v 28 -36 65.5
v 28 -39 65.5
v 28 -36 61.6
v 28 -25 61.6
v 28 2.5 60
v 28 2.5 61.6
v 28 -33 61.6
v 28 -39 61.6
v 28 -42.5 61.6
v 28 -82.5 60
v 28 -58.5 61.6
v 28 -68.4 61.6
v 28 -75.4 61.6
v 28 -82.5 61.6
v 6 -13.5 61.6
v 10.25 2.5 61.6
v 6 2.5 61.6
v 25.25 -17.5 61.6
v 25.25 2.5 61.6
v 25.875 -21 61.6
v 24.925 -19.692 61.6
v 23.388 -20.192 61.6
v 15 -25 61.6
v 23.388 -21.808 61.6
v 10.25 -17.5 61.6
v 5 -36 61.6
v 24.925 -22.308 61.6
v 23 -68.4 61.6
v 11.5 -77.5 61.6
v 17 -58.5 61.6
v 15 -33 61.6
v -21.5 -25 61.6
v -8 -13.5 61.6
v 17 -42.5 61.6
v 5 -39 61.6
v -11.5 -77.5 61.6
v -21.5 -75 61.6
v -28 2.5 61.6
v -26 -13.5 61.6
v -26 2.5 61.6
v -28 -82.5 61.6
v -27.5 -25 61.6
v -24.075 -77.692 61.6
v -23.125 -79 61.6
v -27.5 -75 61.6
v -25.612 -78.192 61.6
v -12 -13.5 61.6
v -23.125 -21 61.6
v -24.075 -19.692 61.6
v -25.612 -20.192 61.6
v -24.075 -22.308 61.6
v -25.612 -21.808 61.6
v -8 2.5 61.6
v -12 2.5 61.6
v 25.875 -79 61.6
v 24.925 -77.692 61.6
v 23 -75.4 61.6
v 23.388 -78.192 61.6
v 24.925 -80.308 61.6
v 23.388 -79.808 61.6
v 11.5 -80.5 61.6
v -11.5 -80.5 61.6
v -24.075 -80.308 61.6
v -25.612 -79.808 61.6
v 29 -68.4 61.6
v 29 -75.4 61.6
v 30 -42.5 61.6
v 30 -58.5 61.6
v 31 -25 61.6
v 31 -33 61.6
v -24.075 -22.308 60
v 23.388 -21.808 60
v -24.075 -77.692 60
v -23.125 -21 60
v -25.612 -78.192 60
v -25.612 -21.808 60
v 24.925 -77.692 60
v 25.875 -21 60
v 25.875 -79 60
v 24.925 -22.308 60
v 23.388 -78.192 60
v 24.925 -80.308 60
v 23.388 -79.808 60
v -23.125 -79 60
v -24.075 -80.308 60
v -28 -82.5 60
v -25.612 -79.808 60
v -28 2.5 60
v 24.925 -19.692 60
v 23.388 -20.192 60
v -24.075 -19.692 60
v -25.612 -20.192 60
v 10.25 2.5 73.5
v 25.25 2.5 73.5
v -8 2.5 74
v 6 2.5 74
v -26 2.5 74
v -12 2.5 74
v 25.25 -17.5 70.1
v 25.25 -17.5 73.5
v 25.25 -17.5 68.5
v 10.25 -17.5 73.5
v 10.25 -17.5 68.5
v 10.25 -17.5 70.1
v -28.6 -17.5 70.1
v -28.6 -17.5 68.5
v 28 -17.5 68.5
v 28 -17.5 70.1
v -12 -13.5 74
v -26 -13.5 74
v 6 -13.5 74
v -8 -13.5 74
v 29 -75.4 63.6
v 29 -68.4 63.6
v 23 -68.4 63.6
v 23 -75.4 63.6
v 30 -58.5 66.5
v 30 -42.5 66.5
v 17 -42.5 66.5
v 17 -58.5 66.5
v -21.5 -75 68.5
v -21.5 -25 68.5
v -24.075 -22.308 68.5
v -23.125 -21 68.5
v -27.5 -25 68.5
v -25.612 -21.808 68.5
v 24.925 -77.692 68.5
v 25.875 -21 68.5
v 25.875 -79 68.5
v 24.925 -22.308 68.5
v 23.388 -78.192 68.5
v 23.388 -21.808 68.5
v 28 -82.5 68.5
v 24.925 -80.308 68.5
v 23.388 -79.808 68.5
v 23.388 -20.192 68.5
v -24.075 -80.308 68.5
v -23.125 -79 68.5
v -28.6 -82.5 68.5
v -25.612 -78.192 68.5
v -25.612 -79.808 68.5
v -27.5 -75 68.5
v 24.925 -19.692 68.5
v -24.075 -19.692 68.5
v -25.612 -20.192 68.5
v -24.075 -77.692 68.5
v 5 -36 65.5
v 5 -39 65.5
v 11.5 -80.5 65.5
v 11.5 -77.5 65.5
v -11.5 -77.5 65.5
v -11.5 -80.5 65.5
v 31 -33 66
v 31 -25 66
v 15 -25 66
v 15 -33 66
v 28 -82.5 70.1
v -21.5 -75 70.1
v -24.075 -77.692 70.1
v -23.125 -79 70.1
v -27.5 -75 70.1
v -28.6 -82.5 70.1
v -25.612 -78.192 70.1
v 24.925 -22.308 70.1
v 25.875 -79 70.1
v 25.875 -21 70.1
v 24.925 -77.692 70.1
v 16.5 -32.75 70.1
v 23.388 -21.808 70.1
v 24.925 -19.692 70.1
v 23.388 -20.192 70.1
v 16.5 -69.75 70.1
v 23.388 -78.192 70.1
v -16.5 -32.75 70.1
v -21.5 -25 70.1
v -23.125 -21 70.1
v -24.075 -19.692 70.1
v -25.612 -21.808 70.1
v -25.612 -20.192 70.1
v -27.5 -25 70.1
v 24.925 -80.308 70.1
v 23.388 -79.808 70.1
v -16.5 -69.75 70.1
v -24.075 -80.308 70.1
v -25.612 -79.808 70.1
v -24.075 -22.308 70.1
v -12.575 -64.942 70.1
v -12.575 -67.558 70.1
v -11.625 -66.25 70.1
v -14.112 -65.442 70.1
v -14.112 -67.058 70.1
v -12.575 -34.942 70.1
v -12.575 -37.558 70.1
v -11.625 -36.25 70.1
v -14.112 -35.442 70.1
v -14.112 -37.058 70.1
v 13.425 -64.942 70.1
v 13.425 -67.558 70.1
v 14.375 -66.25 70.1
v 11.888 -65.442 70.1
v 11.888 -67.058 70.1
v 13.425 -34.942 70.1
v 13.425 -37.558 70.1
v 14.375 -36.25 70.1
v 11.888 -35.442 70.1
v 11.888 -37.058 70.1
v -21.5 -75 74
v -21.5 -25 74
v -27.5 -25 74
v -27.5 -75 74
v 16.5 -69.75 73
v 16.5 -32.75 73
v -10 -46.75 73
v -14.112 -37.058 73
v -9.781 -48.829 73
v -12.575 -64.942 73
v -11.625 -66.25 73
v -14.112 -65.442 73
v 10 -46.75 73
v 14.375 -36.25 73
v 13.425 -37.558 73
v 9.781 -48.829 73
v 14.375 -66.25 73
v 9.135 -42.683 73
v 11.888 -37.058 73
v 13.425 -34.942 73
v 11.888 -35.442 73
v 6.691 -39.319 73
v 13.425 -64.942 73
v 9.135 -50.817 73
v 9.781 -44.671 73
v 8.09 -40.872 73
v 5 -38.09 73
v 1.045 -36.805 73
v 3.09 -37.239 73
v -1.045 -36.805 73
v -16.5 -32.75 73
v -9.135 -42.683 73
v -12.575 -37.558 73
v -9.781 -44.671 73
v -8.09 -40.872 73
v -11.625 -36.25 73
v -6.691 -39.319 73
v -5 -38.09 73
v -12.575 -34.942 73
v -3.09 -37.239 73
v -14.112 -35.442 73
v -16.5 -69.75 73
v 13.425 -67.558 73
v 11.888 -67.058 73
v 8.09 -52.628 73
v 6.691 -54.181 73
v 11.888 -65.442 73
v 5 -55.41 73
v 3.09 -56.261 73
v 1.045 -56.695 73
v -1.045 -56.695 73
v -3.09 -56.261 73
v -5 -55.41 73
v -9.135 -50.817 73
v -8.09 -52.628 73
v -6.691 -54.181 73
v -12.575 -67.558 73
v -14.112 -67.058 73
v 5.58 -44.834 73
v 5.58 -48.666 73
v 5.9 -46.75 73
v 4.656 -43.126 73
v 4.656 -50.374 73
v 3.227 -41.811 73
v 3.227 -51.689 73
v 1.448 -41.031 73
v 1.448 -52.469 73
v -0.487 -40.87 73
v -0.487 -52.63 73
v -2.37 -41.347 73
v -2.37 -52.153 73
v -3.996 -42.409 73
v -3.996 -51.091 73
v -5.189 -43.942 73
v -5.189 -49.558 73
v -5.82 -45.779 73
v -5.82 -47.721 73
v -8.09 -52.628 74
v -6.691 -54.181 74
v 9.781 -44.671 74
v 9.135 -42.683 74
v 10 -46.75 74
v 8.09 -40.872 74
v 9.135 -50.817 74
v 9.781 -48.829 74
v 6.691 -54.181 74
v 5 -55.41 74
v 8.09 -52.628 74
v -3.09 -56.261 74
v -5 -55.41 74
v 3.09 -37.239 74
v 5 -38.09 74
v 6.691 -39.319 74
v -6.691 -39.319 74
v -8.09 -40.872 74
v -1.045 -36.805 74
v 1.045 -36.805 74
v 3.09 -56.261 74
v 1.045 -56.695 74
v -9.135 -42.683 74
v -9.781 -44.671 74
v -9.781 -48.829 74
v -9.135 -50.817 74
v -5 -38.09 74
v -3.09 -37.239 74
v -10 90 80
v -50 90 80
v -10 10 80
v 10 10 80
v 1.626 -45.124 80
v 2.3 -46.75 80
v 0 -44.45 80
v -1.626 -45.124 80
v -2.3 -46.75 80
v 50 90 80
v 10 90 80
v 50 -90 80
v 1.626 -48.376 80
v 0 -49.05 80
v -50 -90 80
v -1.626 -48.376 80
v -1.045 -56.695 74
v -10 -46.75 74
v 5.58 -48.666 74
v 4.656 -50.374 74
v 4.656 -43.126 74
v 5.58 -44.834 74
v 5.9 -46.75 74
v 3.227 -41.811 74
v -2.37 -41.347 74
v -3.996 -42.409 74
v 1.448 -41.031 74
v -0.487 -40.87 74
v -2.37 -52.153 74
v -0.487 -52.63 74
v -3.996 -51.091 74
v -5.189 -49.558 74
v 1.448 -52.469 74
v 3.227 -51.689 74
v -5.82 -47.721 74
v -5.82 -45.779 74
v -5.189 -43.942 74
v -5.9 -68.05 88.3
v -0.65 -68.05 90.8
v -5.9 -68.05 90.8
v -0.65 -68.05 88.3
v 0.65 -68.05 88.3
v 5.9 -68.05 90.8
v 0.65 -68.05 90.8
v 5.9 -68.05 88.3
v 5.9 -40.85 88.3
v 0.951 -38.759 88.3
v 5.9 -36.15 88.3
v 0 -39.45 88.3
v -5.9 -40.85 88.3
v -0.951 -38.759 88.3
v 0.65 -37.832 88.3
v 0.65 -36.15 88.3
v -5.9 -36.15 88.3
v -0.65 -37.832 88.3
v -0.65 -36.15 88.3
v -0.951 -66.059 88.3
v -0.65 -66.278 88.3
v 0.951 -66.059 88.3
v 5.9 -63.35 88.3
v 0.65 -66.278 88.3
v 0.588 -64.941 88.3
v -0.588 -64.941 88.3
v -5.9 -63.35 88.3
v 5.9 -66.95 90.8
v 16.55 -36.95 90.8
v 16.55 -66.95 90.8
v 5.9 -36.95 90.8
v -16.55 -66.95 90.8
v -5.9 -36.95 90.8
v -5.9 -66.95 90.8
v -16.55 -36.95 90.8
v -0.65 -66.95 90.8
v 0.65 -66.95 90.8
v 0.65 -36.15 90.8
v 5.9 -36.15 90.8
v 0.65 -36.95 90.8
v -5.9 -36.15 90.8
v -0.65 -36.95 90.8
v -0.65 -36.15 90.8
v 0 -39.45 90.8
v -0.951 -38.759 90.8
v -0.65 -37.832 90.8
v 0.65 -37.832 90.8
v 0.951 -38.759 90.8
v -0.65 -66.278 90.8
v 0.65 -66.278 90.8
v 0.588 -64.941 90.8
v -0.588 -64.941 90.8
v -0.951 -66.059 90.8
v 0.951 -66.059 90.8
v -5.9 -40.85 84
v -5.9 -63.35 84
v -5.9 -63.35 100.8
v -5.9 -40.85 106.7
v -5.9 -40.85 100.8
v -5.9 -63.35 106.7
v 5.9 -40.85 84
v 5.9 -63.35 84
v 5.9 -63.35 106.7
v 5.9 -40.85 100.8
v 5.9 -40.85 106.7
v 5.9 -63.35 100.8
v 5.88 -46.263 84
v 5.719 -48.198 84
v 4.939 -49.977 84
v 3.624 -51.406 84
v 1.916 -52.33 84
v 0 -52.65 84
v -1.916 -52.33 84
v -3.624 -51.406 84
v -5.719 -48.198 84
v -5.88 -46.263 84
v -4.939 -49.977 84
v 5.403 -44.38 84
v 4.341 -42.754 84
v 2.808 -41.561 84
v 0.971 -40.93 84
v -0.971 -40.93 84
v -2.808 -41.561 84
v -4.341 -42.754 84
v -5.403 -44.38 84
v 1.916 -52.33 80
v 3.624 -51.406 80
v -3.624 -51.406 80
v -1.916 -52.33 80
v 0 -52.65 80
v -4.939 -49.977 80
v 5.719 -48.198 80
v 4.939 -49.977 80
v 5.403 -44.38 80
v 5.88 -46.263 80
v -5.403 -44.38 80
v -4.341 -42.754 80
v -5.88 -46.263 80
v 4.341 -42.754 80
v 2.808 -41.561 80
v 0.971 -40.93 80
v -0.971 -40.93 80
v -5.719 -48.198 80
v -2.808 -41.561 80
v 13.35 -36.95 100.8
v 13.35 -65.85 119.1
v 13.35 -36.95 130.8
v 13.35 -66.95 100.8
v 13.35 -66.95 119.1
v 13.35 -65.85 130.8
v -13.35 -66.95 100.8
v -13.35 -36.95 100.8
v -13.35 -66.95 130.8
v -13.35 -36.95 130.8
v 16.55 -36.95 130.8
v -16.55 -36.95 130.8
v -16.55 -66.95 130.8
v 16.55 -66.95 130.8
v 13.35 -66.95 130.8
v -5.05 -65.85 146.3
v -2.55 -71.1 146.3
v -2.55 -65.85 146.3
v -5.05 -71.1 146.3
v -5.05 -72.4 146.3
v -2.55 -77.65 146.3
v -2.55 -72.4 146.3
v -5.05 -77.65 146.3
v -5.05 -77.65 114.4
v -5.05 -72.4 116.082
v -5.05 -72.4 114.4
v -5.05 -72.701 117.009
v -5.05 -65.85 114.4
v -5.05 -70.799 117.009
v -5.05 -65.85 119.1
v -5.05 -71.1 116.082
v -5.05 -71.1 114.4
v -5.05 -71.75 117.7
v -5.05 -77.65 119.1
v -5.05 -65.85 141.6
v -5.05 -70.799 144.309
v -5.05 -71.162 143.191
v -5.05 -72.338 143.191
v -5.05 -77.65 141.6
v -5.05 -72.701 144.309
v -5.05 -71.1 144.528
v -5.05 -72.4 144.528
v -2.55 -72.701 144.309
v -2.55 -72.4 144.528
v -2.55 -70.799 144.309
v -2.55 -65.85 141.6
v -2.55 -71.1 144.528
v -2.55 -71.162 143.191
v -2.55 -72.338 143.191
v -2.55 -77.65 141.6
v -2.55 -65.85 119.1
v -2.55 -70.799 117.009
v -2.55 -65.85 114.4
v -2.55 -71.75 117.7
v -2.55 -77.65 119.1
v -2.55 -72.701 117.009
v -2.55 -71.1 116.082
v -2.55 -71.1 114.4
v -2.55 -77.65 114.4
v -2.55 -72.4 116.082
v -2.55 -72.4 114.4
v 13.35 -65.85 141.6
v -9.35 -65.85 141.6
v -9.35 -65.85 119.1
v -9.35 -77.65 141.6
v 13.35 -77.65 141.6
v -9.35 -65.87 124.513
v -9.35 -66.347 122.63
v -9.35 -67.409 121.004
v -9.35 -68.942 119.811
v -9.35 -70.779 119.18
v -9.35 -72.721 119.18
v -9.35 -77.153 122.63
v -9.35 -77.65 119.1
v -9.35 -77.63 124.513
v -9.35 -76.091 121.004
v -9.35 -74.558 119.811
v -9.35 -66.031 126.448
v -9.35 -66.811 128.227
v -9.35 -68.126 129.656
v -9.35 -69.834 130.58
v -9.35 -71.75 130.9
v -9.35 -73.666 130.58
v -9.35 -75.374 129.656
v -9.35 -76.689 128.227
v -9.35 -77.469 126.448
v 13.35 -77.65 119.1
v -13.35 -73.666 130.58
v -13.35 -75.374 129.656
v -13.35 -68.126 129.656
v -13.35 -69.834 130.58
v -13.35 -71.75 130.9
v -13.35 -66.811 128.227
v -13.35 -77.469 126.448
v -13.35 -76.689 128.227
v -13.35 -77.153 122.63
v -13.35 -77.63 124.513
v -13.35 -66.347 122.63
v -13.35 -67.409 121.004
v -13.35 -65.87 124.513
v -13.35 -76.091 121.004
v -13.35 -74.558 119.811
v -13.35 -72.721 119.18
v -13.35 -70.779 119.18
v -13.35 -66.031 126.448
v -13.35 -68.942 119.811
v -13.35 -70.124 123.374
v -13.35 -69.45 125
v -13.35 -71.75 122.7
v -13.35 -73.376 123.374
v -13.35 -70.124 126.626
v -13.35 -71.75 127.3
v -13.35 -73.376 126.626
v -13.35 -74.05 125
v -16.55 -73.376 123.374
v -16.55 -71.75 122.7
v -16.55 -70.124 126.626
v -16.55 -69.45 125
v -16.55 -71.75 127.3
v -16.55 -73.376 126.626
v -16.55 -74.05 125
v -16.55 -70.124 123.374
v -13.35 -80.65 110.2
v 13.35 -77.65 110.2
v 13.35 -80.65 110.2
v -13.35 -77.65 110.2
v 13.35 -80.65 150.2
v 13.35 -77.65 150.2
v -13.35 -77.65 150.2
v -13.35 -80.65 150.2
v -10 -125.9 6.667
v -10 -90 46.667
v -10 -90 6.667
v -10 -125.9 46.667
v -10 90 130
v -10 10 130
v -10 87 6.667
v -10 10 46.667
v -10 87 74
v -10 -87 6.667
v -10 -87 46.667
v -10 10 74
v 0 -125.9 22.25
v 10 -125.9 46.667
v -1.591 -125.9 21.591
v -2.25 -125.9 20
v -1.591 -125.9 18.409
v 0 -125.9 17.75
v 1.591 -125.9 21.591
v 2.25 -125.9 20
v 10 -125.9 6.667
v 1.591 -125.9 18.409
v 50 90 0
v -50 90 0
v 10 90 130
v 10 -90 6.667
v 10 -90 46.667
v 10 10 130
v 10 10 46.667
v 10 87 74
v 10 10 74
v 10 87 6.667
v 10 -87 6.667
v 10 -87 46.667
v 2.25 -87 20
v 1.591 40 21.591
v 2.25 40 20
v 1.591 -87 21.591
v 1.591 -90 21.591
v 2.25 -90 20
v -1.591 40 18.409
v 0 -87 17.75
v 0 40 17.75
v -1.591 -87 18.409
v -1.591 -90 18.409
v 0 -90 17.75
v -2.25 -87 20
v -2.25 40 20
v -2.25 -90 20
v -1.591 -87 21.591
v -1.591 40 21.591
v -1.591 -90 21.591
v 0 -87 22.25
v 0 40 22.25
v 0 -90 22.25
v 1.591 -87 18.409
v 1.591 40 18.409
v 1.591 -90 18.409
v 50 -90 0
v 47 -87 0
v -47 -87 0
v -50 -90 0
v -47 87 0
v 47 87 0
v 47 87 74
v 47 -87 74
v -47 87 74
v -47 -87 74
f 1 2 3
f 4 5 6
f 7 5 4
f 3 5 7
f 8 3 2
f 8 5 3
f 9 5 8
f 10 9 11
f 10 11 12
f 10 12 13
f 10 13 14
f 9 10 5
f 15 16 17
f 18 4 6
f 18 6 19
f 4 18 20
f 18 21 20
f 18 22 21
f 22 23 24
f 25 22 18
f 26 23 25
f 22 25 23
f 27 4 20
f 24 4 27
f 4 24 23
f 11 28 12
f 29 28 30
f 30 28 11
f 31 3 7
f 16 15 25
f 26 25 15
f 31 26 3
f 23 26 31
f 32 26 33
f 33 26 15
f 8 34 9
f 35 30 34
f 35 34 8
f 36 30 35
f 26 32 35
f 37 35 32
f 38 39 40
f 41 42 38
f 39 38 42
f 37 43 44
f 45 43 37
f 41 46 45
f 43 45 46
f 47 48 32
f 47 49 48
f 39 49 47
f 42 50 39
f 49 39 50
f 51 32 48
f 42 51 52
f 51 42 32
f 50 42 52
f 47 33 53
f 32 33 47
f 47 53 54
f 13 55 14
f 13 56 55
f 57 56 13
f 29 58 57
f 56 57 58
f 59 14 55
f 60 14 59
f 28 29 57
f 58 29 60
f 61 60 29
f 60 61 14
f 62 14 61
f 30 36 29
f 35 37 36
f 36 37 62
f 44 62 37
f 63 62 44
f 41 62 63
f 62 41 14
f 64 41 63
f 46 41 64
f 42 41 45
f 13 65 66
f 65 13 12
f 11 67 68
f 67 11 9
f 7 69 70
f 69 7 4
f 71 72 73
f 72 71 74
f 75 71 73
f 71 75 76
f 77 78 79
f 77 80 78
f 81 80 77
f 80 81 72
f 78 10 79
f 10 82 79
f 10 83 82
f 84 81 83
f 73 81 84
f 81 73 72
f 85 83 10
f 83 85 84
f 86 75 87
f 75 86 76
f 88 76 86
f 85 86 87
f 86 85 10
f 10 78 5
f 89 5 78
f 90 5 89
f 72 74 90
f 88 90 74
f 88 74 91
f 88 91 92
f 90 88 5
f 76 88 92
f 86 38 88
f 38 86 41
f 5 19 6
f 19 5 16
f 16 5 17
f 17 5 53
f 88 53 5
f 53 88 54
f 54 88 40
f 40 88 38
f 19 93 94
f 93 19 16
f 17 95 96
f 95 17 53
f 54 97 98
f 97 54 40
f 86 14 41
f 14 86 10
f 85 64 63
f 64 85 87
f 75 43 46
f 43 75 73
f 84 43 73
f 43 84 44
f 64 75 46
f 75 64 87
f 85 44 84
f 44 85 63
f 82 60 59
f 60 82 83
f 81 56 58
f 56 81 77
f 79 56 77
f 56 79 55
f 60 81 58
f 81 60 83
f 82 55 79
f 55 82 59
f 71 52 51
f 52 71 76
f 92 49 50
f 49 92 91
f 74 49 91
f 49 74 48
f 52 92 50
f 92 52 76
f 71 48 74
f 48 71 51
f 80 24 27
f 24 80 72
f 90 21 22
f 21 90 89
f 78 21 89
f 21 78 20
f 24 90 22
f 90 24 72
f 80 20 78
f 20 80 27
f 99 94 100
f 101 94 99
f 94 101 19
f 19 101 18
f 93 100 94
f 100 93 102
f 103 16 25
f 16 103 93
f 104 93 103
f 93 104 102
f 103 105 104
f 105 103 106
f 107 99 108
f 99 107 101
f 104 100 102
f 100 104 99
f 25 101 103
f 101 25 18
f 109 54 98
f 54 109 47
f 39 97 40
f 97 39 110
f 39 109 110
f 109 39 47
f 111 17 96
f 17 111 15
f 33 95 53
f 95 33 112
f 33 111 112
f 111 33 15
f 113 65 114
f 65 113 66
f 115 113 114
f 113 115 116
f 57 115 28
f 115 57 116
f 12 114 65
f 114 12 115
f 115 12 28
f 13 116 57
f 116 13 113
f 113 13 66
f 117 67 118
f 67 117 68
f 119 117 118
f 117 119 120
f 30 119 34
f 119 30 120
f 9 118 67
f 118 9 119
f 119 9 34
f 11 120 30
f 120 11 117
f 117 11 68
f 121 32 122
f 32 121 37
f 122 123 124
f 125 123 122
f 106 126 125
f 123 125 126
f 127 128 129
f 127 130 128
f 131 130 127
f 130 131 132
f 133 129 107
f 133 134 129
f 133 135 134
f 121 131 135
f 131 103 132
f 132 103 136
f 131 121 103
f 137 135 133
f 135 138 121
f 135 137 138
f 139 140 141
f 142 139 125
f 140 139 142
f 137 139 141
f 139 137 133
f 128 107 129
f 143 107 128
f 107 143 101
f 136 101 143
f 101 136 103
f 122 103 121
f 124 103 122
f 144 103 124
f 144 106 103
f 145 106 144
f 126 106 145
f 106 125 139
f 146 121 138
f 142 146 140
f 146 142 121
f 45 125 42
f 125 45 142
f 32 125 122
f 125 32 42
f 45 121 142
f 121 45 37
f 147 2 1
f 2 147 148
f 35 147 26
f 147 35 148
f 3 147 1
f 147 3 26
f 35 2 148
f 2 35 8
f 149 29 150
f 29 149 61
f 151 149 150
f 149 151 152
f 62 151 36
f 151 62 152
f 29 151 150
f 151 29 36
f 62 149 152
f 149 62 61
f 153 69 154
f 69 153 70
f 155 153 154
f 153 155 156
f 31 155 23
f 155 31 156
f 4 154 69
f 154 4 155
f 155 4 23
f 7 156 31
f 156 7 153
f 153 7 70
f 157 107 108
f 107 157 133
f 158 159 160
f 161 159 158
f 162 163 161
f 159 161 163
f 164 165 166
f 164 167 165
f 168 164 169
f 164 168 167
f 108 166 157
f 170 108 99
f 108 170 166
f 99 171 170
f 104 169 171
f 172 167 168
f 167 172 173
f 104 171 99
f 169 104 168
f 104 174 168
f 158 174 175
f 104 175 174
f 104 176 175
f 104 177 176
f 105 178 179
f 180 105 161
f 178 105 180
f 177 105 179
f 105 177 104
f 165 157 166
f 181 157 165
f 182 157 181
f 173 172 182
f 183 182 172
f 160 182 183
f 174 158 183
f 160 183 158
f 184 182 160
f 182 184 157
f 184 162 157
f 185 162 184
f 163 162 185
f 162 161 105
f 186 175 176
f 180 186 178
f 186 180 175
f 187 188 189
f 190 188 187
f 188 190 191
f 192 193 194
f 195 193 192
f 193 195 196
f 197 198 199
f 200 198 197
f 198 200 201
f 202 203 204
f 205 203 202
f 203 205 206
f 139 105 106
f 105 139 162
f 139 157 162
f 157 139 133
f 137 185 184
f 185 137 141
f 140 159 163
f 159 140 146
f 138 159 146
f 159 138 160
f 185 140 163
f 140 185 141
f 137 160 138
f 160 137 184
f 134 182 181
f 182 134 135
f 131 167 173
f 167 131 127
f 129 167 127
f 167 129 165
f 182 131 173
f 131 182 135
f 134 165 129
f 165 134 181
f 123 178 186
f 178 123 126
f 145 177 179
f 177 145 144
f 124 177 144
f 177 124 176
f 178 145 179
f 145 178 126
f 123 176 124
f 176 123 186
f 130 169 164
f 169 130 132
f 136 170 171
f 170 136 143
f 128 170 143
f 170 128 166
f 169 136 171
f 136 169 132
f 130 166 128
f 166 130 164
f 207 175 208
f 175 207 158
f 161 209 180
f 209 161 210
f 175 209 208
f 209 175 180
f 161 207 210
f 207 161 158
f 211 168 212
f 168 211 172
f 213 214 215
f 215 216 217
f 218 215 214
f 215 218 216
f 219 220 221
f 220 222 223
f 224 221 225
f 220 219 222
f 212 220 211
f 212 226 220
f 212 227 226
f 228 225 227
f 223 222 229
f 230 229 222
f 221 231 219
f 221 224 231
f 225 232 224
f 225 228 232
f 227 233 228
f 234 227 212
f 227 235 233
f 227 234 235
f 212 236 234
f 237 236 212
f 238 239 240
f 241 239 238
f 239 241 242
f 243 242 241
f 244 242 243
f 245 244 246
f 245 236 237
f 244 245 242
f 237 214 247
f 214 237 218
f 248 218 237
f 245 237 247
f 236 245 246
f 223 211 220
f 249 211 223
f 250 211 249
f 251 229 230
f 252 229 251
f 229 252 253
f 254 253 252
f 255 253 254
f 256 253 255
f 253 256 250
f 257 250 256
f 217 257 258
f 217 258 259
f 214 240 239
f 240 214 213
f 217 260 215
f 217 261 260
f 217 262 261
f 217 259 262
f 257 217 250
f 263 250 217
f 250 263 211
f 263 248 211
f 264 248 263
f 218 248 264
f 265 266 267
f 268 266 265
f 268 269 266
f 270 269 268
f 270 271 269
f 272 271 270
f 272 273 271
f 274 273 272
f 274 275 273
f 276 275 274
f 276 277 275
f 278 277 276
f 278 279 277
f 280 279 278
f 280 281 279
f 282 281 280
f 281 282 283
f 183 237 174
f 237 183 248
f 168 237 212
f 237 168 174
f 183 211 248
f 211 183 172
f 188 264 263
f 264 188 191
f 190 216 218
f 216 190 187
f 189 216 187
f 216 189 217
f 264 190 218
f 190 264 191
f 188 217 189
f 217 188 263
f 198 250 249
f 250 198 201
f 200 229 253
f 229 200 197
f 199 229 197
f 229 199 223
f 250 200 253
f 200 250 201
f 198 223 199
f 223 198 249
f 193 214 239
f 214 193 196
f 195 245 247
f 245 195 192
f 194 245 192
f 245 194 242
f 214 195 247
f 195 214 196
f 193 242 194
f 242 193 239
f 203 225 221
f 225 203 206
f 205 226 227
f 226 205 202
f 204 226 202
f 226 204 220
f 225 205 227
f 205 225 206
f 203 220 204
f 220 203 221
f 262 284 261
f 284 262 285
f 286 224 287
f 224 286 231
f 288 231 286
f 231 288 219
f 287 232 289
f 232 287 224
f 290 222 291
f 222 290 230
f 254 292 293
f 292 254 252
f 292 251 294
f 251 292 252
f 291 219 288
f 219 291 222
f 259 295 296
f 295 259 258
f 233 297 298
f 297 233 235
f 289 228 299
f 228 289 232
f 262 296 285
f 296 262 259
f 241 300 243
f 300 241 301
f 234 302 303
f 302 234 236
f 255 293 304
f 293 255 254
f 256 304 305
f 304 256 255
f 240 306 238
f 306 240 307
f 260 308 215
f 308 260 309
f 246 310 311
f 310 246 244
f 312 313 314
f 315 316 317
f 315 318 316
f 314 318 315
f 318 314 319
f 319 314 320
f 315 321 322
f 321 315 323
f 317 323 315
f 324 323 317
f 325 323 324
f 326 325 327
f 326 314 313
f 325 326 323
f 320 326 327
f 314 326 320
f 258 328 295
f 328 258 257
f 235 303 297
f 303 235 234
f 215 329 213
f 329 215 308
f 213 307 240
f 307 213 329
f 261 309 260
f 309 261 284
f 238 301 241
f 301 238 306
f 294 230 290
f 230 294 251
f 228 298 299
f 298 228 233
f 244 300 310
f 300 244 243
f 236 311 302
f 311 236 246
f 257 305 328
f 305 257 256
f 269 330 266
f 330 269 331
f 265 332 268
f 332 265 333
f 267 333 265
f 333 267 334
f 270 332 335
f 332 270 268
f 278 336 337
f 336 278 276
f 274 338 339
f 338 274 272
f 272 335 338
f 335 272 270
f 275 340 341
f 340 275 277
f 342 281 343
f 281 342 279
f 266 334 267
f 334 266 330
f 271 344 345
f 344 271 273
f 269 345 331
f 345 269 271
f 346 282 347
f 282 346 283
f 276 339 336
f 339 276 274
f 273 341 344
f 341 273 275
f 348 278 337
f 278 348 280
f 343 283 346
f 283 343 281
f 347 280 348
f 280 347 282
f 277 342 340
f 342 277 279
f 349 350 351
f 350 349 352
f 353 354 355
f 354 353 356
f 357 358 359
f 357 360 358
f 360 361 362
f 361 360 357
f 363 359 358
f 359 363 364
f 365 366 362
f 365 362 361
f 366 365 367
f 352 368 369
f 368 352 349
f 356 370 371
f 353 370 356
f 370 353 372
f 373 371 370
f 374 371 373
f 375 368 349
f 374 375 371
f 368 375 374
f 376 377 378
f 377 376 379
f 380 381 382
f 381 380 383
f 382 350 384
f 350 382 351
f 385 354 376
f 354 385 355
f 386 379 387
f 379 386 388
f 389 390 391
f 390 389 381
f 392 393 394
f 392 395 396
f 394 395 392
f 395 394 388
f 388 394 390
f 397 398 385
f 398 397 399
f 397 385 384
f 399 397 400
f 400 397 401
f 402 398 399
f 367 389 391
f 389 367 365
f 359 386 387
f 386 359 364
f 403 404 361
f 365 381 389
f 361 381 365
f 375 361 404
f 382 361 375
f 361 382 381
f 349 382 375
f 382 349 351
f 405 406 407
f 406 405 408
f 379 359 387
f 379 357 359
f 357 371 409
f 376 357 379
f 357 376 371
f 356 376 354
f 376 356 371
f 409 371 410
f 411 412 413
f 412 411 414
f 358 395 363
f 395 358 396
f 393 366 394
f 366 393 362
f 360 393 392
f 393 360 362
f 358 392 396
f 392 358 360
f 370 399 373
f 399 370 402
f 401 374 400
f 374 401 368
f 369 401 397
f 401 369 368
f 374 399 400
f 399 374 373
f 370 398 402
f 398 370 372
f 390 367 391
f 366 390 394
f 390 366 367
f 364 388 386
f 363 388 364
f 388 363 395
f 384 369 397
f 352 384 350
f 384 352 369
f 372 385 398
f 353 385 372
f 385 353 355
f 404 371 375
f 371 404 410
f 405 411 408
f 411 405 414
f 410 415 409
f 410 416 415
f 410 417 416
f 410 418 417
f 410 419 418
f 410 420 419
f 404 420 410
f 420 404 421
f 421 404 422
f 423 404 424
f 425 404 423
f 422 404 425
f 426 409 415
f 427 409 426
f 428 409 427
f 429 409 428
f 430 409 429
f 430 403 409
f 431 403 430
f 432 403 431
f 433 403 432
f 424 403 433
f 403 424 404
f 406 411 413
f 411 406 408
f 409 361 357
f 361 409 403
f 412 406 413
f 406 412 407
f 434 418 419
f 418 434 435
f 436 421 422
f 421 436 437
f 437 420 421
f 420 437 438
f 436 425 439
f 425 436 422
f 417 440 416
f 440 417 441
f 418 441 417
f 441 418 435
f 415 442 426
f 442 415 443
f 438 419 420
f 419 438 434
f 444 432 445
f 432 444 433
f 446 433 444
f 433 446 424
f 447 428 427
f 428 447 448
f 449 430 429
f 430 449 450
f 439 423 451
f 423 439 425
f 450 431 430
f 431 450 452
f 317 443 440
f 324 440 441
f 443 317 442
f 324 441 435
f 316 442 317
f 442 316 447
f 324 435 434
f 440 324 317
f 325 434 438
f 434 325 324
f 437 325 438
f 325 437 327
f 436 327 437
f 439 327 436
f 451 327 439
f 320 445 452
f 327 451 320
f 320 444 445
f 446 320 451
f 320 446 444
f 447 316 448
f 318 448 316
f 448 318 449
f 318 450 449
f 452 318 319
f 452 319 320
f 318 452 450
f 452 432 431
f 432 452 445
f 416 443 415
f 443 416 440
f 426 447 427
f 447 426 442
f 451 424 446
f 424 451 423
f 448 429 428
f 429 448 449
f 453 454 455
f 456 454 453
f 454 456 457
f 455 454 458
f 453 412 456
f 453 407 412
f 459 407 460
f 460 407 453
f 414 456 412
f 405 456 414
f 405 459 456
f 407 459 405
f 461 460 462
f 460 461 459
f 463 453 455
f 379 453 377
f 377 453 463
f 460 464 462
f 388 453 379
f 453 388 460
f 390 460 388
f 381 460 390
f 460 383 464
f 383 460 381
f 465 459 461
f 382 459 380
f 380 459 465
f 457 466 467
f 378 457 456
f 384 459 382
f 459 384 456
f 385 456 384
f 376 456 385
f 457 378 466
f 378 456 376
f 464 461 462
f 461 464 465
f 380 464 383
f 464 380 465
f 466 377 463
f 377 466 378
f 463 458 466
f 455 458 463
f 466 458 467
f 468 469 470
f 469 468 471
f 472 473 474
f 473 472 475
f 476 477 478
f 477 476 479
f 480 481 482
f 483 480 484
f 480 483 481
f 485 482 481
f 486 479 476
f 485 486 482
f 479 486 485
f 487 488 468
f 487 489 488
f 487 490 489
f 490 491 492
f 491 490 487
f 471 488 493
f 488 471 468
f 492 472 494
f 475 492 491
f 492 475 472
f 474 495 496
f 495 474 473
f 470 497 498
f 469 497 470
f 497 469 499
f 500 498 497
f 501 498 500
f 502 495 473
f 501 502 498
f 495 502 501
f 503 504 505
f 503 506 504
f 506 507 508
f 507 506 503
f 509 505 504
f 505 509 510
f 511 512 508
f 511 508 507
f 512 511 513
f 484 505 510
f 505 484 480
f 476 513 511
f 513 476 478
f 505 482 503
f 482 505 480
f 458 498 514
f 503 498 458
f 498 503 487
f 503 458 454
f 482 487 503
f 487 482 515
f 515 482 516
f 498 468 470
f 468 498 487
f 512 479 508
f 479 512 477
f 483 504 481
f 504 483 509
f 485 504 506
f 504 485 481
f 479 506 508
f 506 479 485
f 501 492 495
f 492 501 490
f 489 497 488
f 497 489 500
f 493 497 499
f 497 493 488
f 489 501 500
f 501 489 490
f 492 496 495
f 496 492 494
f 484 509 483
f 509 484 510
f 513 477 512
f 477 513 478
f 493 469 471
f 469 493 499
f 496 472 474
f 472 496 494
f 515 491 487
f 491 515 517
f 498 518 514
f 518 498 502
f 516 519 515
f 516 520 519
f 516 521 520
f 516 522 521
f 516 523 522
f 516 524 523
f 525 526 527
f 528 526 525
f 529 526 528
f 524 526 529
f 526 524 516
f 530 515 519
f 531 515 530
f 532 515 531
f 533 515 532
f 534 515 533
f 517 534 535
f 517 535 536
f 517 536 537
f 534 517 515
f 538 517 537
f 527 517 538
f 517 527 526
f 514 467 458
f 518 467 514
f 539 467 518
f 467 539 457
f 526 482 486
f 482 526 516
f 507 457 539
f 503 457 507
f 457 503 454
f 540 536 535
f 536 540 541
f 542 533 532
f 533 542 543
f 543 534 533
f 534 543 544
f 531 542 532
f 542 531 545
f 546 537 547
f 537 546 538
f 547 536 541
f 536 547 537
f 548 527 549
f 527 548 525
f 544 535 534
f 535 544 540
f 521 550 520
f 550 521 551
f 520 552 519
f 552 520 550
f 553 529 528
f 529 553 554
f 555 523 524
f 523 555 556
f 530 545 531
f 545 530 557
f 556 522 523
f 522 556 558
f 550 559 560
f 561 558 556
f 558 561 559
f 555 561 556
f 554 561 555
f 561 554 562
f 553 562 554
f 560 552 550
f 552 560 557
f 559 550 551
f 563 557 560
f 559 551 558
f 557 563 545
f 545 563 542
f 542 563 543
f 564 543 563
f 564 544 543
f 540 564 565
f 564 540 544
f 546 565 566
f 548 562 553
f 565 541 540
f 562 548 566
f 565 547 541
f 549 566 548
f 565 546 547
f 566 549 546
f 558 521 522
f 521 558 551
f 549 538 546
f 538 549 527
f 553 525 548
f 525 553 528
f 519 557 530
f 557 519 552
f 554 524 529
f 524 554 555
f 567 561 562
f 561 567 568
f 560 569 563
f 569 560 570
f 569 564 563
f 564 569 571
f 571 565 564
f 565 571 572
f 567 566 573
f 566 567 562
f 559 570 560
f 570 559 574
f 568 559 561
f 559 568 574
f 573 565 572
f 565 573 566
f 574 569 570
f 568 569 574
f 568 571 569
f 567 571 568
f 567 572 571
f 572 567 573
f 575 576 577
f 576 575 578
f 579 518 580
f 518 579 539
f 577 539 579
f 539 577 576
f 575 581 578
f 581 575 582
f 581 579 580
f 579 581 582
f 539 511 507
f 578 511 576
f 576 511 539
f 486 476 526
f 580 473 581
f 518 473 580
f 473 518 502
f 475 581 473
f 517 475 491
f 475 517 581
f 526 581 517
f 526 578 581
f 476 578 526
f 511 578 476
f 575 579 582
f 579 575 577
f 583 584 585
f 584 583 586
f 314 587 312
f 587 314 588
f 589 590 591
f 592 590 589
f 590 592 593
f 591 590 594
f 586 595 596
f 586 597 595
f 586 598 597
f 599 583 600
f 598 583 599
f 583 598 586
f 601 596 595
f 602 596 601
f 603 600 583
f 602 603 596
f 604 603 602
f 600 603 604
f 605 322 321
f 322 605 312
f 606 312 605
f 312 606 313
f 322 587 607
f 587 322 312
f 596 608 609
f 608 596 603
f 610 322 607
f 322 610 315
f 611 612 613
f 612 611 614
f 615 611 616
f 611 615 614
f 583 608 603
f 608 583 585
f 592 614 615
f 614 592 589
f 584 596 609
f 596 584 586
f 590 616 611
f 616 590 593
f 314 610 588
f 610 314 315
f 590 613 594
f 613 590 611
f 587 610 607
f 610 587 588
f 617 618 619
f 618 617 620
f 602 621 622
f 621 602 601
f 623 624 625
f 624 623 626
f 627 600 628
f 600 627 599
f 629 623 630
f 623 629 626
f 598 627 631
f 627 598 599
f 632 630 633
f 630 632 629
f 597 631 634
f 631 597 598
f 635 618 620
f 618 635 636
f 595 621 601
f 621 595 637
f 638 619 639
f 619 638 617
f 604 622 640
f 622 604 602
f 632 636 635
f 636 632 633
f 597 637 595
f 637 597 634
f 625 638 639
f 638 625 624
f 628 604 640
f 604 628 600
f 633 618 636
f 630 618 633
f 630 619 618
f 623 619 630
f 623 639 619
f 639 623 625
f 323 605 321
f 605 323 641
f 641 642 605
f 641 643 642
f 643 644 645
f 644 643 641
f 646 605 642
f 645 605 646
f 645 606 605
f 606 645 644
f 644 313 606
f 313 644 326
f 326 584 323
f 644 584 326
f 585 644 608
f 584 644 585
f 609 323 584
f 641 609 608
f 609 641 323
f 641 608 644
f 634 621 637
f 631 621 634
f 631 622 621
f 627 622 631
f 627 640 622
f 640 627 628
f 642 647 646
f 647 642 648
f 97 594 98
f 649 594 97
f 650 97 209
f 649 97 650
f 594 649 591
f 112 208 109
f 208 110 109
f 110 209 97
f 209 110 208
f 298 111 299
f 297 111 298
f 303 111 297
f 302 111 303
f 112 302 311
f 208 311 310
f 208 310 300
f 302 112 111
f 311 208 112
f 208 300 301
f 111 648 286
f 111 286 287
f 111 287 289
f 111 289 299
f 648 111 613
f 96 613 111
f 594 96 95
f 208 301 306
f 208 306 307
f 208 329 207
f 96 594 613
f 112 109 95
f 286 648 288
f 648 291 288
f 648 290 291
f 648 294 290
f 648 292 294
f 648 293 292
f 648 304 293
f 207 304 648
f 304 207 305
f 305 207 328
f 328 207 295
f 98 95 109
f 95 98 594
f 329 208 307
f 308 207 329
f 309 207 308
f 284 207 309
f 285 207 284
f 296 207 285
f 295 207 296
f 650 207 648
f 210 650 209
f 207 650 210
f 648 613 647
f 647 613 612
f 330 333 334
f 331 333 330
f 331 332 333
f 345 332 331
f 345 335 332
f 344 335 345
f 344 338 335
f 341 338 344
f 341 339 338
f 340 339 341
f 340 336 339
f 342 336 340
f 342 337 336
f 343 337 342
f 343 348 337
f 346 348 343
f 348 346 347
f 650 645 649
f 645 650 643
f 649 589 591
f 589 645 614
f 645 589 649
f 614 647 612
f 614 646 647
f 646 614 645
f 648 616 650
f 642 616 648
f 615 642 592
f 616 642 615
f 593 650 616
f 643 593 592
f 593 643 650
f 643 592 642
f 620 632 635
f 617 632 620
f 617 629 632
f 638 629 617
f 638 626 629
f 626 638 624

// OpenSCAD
// file: servo_sg90.scad
servo_sg90();

module servo_sg90()
{
    width = 22.5;
    length = 11.8;
    height = 22.7;
    
    mounting_width = width + (2 * 4.7);
    mounting_length = length;
    mounting_height = 2.5;
    mounting_width_offset = -4.7;
    mounting_height_offset = 18.4 - mounting_height;
    
    mounting_hole_diameter = 2;
    mounting_hole_width_offset = 2.3;
    mounting_hole_length_offset = 5.9;
    
    mounting_notch_width = mounting_hole_width_offset;
    mounting_notch_length = 1.3;
    mounting_notch_width_offset = mounting_notch_width / 2;
    
    mount_point_height = 4;
    mount_point_diameter = 11.8;
    mount_point_width_offset = 5.9;
    mount_point_length_offset = length / 2;
    mount_point_height_offset = height;
    
    gear_height = 3.2;
    gear_diameter = 4.6;
    gear_width_offset = mount_point_width_offset;
    gear_length_offset = mount_point_length_offset;
    gear_height_offset = mount_point_height_offset + mount_point_height;
    
    rotate([0, 180, 0])
    translate([-(gear_width_offset), -(gear_length_offset), -(height + mount_point_height)])
    union()
    {
        color("blue", 1.0)
        cube([width, length, height], false);
        
        color("blue", 1.0)
        translate([mounting_width_offset, 0, mounting_height_offset])
        difference()
        {
            cube([mounting_width, mounting_length, mounting_height], false);
            
            translate([mounting_hole_width_offset, mounting_hole_length_offset, 0])
            cylinder(height, d = mounting_hole_diameter);
            
            translate([mounting_width - mounting_hole_width_offset, mounting_hole_length_offset, 0])
            cylinder(height, d = mounting_hole_diameter);
            
            translate([mounting_notch_width_offset, mounting_hole_length_offset, 0])
            cube([mounting_notch_width, mounting_notch_length, height], true);

            translate([mounting_width - mounting_notch_width_offset, mounting_hole_length_offset, 0])
            cube([mounting_notch_width, mounting_notch_length, height], true);
        }
        
        color("blue", 1.0)
        translate([mount_point_width_offset, mount_point_length_offset, mount_point_height_offset])
        cylinder(mount_point_height, d = mount_point_diameter);
        
        color("white", 1.0)
        translate([gear_width_offset, gear_length_offset, gear_height_offset])
        cylinder(gear_height, d = gear_diameter);
    }
}
// file: raspberry_pi_pan_tilt.scad
use <servo_sg90.scad>

raspberry_pi_pan_tilt_base__base_height = 3;
raspberry_pi_pan_tilt_base__bottom_servo_mount_height = 7;

raspberry_pi_pan_tilt(6.5, 0, 0);

module raspberry_pi_pan_tilt(bottom_mount_offset, pan_angle, tilt_angle)
{
    bottom_servo_height_offset = 10;
    
    bottom_servo_housing_width = 26.7;
    bottom_servo_housing_length = 30;
    bottom_servo_housing_height = 10;
    bottom_servo_housing_mount_height = 40;
    bottom_servo_housing_length_offset = -5.2;
    bottom_servo_housing_height_offset = bottom_servo_height_offset + 10.8;
    
    top_servo_width_offset = -(26.7 / 2);//-15;
    top_servo_length_offset = -25;
    top_servo_height_offset = 55;

    top_servo_housing_width = 40;
    top_servo_housing_length = 3;
    top_servo_housing_height = 26.7;
    top_servo_housing_width_offset = -5.2;
    top_servo_housing_length_offset = -5.9 - (top_servo_housing_length / 2);
    top_servo_housing_height_offset = 0;
    
    raspberry_pi_pan_tilt_base(bottom_mount_offset);

    rotate([0, 0, pan_angle])
    union()
    {
        rotate([0, 0, 90])
        translate([0, 0, bottom_servo_height_offset])
        servo_sg90();
        
        translate([0, bottom_servo_housing_length_offset, bottom_servo_housing_height_offset])
        raspberry_pi_pan_tilt_bottom_servo_housing(bottom_servo_housing_width, bottom_servo_housing_length, bottom_servo_housing_height, bottom_servo_housing_mount_height);

        rotate([90, 90, 90])
        translate([-top_servo_height_offset, top_servo_length_offset, top_servo_width_offset])
        rotate([0, 0, tilt_angle])
        union()
        {
            servo_sg90();
            
            translate([top_servo_housing_width_offset, top_servo_housing_length_offset, top_servo_housing_height_offset])
            raspberry_pi_pan_tilt_top_servo_housing(top_servo_housing_width, top_servo_housing_length, top_servo_housing_height);
        }
    }
}

module raspberry_pi_pan_tilt_base(bottom_mount_offset)
{
    base_width = 33;
    base_length = 37;
    base_height = 3;
    
    mounting_hole_width = 26;
    mounting_hole_length = 30;
    
    mounting_hole_diameter = 2.75;
    mounting_hole_width_offset = (base_width - mounting_hole_width) / 2;
    mounting_hole_length_offset = (base_length - mounting_hole_length) / 2;
    
    bottom_servo_mount_height = 7;
    bottom_servo_mount_outer_diameter = 20;
    bottom_servo_mount_inner_diameter = 11.8;
    
    bottom_servo_mount_width_offset = base_width / 2;
    bottom_servo_mount_length_offset = bottom_mount_offset + (base_width / 2);
    bottom_servo_mount_height_offset = base_height;

    translate([-(bottom_servo_mount_width_offset), -(bottom_servo_mount_length_offset), 0])
    color("black", 1.0)
    union()
    {
        difference()
        {
            cube([base_width, base_length, base_height], false);
            
            translate([mounting_hole_width_offset, mounting_hole_length_offset, 0])
            cylinder(base_height * 2, d = mounting_hole_diameter, true);

            translate([base_width - mounting_hole_width_offset, mounting_hole_length_offset, 0])
            cylinder(base_height * 2, d = mounting_hole_diameter, true);

            translate([mounting_hole_width_offset, base_length - mounting_hole_length_offset, 0])
            cylinder(base_height * 2, d = mounting_hole_diameter, true);

            translate([base_width - mounting_hole_width_offset, base_length - mounting_hole_length_offset, 0])
            cylinder(base_height * 2, d = mounting_hole_diameter, true);
        }
        
        translate([bottom_servo_mount_width_offset, bottom_servo_mount_length_offset, bottom_servo_mount_height_offset])
        difference()
        {
            cylinder(bottom_servo_mount_height, d = bottom_servo_mount_outer_diameter);
            cylinder(bottom_servo_mount_height, d = bottom_servo_mount_inner_diameter);
        }
    }
}

module raspberry_pi_pan_tilt_bottom_servo_housing(housing_width, housing_length, housing_height, mount_height)
{
    thickness = 3.2;
    
    color("black", 1.0)
    translate([-(housing_width / 2), -(housing_length / 2), 0])
    union()
    {
        cube([housing_width, housing_length, housing_height], false);
        
        translate([-thickness, 0, 0])
        cube([thickness, housing_length, mount_height]);

        translate([housing_width, 0, 0])
        cube([thickness, housing_length, mount_height]);
    }
}

module raspberry_pi_pan_tilt_top_servo_housing(housing_width, housing_length, housing_height)
{
    color("black", 1.0)
    translate([-(housing_width / 2), -(housing_length / 2), 0])
    cube([housing_width, housing_length, housing_height], false);
}
// file: maker_focus_pan_tilt_hat.scad
maker_focus_pan_tilt_hat();

module maker_focus_pan_tilt_hat()
{
    board_width = 56.6;
    board_length = 65;
    board_height = 1.6;
    
    mounting_pad_diameter = 6;
    mounting_hole_diameter = 2.75;
    mounting_hole_width_offset_1 = 4.1;
    mounting_hole_width_offset_2 = 3.5;
    mounting_hole_length_offset_1 = 3.5;
    mounting_hole_length_offset_2 = mounting_hole_length_offset_1 + 58; 
    
    header_width = 6;
    header_length = 50;
    header_height = 8.5 - board_height;
    header_length_offset = mounting_hole_length_offset_1 + 29 - (header_length / 2);
    header_width_offset = mounting_hole_width_offset_1 - (header_width / 2);;

    translate([-(board_width / 2), -(board_length / 2), 0])
    union()
    {
        difference()
        {
            union()
            {
                difference()
                {
                    color("blue", 1.0)
                    cube([board_width, board_length, board_height]);

                    translate([mounting_hole_width_offset_1, mounting_hole_length_offset_1, 0])
                    cylinder(board_height * 2, d = mounting_pad_diameter, true);

                    translate([board_width - mounting_hole_width_offset_2, mounting_hole_length_offset_1, 0])
                    cylinder(board_height * 2, d = mounting_pad_diameter, true);

                    translate([mounting_hole_width_offset_1, mounting_hole_length_offset_2, 0])
                    cylinder(board_height * 2, d = mounting_pad_diameter, true);

                    translate([board_width - mounting_hole_width_offset_2, mounting_hole_length_offset_2, 0])
                    cylinder(board_height * 2, d = mounting_pad_diameter, true);
                }
                color("gold", 1.0)
                {
                    translate([mounting_hole_width_offset_1, mounting_hole_length_offset_1, 0])
                    cylinder(board_height, d = mounting_pad_diameter, true);

                    translate([board_width - mounting_hole_width_offset_2, mounting_hole_length_offset_1, 0])
                    cylinder(board_height, d = mounting_pad_diameter, true);

                    translate([mounting_hole_width_offset_1, mounting_hole_length_offset_2, 0])
                    cylinder(board_height, d = mounting_pad_diameter, true);

                    translate([board_width - mounting_hole_width_offset_2, mounting_hole_length_offset_2, 0])
                    cylinder(board_height, d = mounting_pad_diameter, true);
                }
            }
            translate([mounting_hole_width_offset_1, mounting_hole_length_offset_1, 0])
            cylinder(board_height * 2, d = mounting_hole_diameter, true);

            translate([board_width - mounting_hole_width_offset_2, mounting_hole_length_offset_1, 0])
            cylinder(board_height * 2, d = mounting_hole_diameter, true);

            translate([mounting_hole_width_offset_1, mounting_hole_length_offset_2, 0])
            cylinder(board_height * 2, d = mounting_hole_diameter, true);

            translate([board_width - mounting_hole_width_offset_2, mounting_hole_length_offset_2, 0])
            cylinder(board_height * 2, d = mounting_hole_diameter, true);
        }
        
        color("gold", 1.0)
        translate([header_width_offset, header_length_offset, board_height])
        cube([header_width, header_length, header_height]);
    }
}
// file: raspberry_pi.scad
raspberry_pi(2);

module raspberry_pi(model)
{
    board_width = 56;
    board_length = model==1?65:model==2?85:85;
    board_height = 1.6;
    
    mounting_pad_diameter = 6;
    mounting_hole_diameter = 2.75;
    mounting_hole_width_offset = 3.5;
    mounting_hole_length_offset_1 = 3.5;
    mounting_hole_length_offset_2 = mounting_hole_length_offset_1 + 58; 
    
    usb_height_variation = model==1?7:model==2?16:16;
    usb_width_offset_variation = model==1?31.5:model==2?29:29;
    
    usb_width = 14;
    usb_length = 16;
    usb_height = usb_height_variation - board_height;
    usb_length_offset = board_length - usb_length;
    usb_1_width_offset = board_width - usb_width_offset_variation - (usb_width / 2);
    usb_2_width_offset = board_width - 47 - (usb_width / 2);
    
    eth_width = 15;
    eth_length = 20;
    eth_height = 13.5 - board_height;
    eth_width_offset = board_width - 10.25 - (eth_width / 2);
    eth_length_offset = board_length - eth_length;
    
    usb_power_width = 6;
    usb_power_length = 7;
    usb_power_height = 2;
    usb_power_length_offset = 10.6 - (usb_power_length / 2);
    usb_power_width_overhang = 1;
    usb_power_width_offset = board_width - usb_power_width + usb_power_width_overhang;

    hdmi_width = 13;
    hdmi_length = 16;
    hdmi_height = 6.5 - board_height;
    hdmi_overhang = 2;
    hdmi_length_offset = 32 - (hdmi_length / 2);
    hdmi_width_offset = board_width - hdmi_width + hdmi_overhang;
    
    header_width = 6;
    header_length = 50;
    header_height = 8.5 - board_height;
    header_length_offset = mounting_hole_length_offset_1 + 29 - (header_length / 2);
    header_width_offset = mounting_hole_width_offset - (header_width / 2);;

    camera_width = 23;
    camera_length = 3;
    camera_height = 5.5 - board_height;
    camera_length_offset = 32 + 13 - (camera_length / 2);
    camera_width_offset = board_width - 11.5 - (camera_width / 2);
    
    display_width = 23;
    display_length = 3;
    display_height = 5.5 - board_height;
    display_length_offset = mounting_hole_width_offset - (camera_length / 2);
    display_width_offset = board_width - 28 - (camera_width / 2);
    
    audio_width = 16;
    audio_length = 8;
    audio_height = 6 - board_height;
    audio_overhang = 3;
    audio_length_offset = 53.5 - (audio_length / 2);
    audio_width_offset = board_width - audio_width + audio_overhang;
    
    translate([-(board_width / 2), -(board_length / 2), 0])
    union()
    {
        difference()
        {
            union()
            {
                difference()
                {
                    color("green", 1.0)
                    cube([board_width, board_length, board_height]);

                    translate([mounting_hole_width_offset, mounting_hole_length_offset_1, 0])
                    cylinder(board_height * 2, d = mounting_pad_diameter, true);

                    translate([board_width - mounting_hole_width_offset, mounting_hole_length_offset_1, 0])
                    cylinder(board_height * 2, d = mounting_pad_diameter, true);

                    translate([mounting_hole_width_offset, mounting_hole_length_offset_2, 0])
                    cylinder(board_height * 2, d = mounting_pad_diameter, true);

                    translate([board_width - mounting_hole_width_offset, mounting_hole_length_offset_2, 0])
                    cylinder(board_height * 2, d = mounting_pad_diameter, true);
                }
                color("gold", 1.0)
                {
                    translate([mounting_hole_width_offset, mounting_hole_length_offset_1, 0])
                    cylinder(board_height, d = mounting_pad_diameter, true);

                    translate([board_width - mounting_hole_width_offset, mounting_hole_length_offset_1, 0])
                    cylinder(board_height, d = mounting_pad_diameter, true);

                    translate([mounting_hole_width_offset, mounting_hole_length_offset_2, 0])
                    cylinder(board_height, d = mounting_pad_diameter, true);

                    translate([board_width - mounting_hole_width_offset, mounting_hole_length_offset_2, 0])
                    cylinder(board_height, d = mounting_pad_diameter, true);
                }
            }
            translate([mounting_hole_width_offset, mounting_hole_length_offset_1, 0])
            cylinder(board_height * 2, d = mounting_hole_diameter, true);

            translate([board_width - mounting_hole_width_offset, mounting_hole_length_offset_1, 0])
            cylinder(board_height * 2, d = mounting_hole_diameter, true);

            translate([mounting_hole_width_offset, mounting_hole_length_offset_2, 0])
            cylinder(board_height * 2, d = mounting_hole_diameter, true);

            translate([board_width - mounting_hole_width_offset, mounting_hole_length_offset_2, 0])
            cylinder(board_height * 2, d = mounting_hole_diameter, true);
        }
        
        if(model == 2)
        {
            color("silver", 1.0)
            translate([eth_width_offset, eth_length_offset, board_height])
            cube([eth_width, eth_length, eth_height]);

            color("silver", 1.0)
            translate([usb_2_width_offset, usb_length_offset, board_height])
            cube([usb_width, usb_length, usb_height]);
        }

        color("silver", 1.0)
        translate([usb_1_width_offset, usb_length_offset, board_height])
        cube([usb_width, usb_length, usb_height]);

        color("silver", 1.0)
        translate([usb_power_width_offset, usb_power_length_offset, board_height])
        cube([usb_power_width, usb_power_length, usb_power_height]);

        color("silver", 1.0)
        translate([hdmi_width_offset, hdmi_length_offset, board_height])
        cube([hdmi_width, hdmi_length, hdmi_height]);

        color("gold", 1.0)
        translate([header_width_offset, header_length_offset, board_height])
        cube([header_width, header_length, header_height]);
        
        color("black", 1.0)
        translate([camera_width_offset, camera_length_offset, board_height])
        cube([camera_width, camera_length, camera_height]);
        
        color("black", 1.0)
        translate([display_width_offset, display_length_offset, board_height])
        cube([display_width, display_length, display_height]);

        color("black", 1.0)
        translate([audio_width_offset, audio_length_offset, board_height])
        cube([audio_width, audio_length, audio_height]);
    }
}
// file: tank_gun.scad
tank_gun(8.5*25.4);

module tank_gun(length)
{
    outer_diameter = 9;
    inner_diameter = 4.5;
    
    receiver_width = 20;
    receiver_length = 40;
    receiver_height = length;
    receiver_width_offset = -(receiver_width / 2);
    receiver_length_offset = -(receiver_length / 1.5);
    receiver_height_offset = 0;
    
    grip_width = receiver_width;
    grip_length = 100;
    grip_height = 80;
    grip_width_offset = -(grip_width / 2);
    grip_length_offset = -grip_length + receiver_width_offset;
    grip_height_offset = 0;
    
    assembly_width_offset = 0;
    assembly_length_offset = 0;
    assembly_height_offset = -50;    
    
    rotate([90, 180, 0])
    difference()
    {
        translate([assembly_width_offset, assembly_length_offset, assembly_height_offset])
        union()
        {
            color("black", 1.0)
            translate([receiver_width_offset, receiver_length_offset, receiver_height_offset])
            cube([receiver_width, receiver_length, receiver_height], false);

            color("black", 1.0)
            translate([grip_width_offset, grip_length_offset, grip_height_offset])
            cube([grip_width, grip_length, grip_height], false);

            color("beige", 1.0)
            cylinder(length, d = outer_diameter, true);
        }
        cylinder(length, d = inner_diameter, true);
    }
}
// file: raspberry_pi_assembly.scad
use <raspberry_pi.scad>
use <maker_focus_pan_tilt_hat.scad>
use <raspberry_pi_pan_tilt.scad>

raspberry_pi_assembly(2, 0, 0);

module raspberry_pi_assembly(model, pan, tilt)
{
    hat_mounting_width_offset = -0.3;
    hat_mounting_length_offset = model==1?0:model==2?-10:-10;
    hat_mounting_height_offset = 8.5;
    
    pan_tilt_bottom_mount_offset = 6.5;
    pan_tilt_mounting_width_offset = 0;
    pan_tilt_mounting_length_offset = (pan_tilt_bottom_mount_offset / 2) + (model==1?0:model==2?-10:-10);
    pan_tilt_mounting_height_offset = hat_mounting_height_offset + 1.5;
    
    raspberry_pi(model);

    translate([hat_mounting_width_offset, hat_mounting_length_offset, hat_mounting_height_offset])
    maker_focus_pan_tilt_hat();
    
    translate([pan_tilt_mounting_width_offset, pan_tilt_mounting_length_offset, pan_tilt_mounting_height_offset])
    raspberry_pi_pan_tilt(pan_tilt_bottom_mount_offset, pan, tilt);
}
// main file
use <raspberry_pi_assembly.scad>
use <tank_gun.scad>

tank_turret(100, 180, 80, 0, 0, 0, 0);

module tank_turret(width, length, height, camera_pan, camera_tilt, turret_pan, tank_gun_tilt)
{
    tank_turret_thickness = 3;
    tank_turret_alpha = 0.5;
    
    raspberry_pi_assembly_width_offset = 0;
    raspberry_pi_assembly_length_offset = -40;
    raspberry_pi_assembly_height_offset = 20;
    
    tank_gun_length = 8.5 * 25.4;
    tank_gun_width_offset = 0;
    tank_gun_length_offset = 40;
    tank_gun_height_offset = -20;
    
    translate([0, 0,(height / 2)])
    {
        rotate([0, 0, turret_pan])
        union()
        {
            /* Raspberry Pi and attachments */
            translate([raspberry_pi_assembly_width_offset, raspberry_pi_assembly_length_offset, raspberry_pi_assembly_height_offset])
            raspberry_pi_assembly(2, camera_pan, camera_tilt);
            
            /* Tank gun */
            rotate([tank_gun_tilt, 0, 0])
            translate([tank_gun_width_offset, tank_gun_length_offset, tank_gun_height_offset])
            tank_gun(tank_gun_length);

            /* Turret body */
            color(alpha = tank_turret_alpha)
            difference()
            {
                cube([width, length, height], center = true);
                translate([0, 0, -tank_turret_thickness])
                cube([width - (tank_turret_thickness * 2), length - (tank_turret_thickness * 2), height - (tank_turret_thickness * 2)], center = true);
            }
        }
    }    
}
